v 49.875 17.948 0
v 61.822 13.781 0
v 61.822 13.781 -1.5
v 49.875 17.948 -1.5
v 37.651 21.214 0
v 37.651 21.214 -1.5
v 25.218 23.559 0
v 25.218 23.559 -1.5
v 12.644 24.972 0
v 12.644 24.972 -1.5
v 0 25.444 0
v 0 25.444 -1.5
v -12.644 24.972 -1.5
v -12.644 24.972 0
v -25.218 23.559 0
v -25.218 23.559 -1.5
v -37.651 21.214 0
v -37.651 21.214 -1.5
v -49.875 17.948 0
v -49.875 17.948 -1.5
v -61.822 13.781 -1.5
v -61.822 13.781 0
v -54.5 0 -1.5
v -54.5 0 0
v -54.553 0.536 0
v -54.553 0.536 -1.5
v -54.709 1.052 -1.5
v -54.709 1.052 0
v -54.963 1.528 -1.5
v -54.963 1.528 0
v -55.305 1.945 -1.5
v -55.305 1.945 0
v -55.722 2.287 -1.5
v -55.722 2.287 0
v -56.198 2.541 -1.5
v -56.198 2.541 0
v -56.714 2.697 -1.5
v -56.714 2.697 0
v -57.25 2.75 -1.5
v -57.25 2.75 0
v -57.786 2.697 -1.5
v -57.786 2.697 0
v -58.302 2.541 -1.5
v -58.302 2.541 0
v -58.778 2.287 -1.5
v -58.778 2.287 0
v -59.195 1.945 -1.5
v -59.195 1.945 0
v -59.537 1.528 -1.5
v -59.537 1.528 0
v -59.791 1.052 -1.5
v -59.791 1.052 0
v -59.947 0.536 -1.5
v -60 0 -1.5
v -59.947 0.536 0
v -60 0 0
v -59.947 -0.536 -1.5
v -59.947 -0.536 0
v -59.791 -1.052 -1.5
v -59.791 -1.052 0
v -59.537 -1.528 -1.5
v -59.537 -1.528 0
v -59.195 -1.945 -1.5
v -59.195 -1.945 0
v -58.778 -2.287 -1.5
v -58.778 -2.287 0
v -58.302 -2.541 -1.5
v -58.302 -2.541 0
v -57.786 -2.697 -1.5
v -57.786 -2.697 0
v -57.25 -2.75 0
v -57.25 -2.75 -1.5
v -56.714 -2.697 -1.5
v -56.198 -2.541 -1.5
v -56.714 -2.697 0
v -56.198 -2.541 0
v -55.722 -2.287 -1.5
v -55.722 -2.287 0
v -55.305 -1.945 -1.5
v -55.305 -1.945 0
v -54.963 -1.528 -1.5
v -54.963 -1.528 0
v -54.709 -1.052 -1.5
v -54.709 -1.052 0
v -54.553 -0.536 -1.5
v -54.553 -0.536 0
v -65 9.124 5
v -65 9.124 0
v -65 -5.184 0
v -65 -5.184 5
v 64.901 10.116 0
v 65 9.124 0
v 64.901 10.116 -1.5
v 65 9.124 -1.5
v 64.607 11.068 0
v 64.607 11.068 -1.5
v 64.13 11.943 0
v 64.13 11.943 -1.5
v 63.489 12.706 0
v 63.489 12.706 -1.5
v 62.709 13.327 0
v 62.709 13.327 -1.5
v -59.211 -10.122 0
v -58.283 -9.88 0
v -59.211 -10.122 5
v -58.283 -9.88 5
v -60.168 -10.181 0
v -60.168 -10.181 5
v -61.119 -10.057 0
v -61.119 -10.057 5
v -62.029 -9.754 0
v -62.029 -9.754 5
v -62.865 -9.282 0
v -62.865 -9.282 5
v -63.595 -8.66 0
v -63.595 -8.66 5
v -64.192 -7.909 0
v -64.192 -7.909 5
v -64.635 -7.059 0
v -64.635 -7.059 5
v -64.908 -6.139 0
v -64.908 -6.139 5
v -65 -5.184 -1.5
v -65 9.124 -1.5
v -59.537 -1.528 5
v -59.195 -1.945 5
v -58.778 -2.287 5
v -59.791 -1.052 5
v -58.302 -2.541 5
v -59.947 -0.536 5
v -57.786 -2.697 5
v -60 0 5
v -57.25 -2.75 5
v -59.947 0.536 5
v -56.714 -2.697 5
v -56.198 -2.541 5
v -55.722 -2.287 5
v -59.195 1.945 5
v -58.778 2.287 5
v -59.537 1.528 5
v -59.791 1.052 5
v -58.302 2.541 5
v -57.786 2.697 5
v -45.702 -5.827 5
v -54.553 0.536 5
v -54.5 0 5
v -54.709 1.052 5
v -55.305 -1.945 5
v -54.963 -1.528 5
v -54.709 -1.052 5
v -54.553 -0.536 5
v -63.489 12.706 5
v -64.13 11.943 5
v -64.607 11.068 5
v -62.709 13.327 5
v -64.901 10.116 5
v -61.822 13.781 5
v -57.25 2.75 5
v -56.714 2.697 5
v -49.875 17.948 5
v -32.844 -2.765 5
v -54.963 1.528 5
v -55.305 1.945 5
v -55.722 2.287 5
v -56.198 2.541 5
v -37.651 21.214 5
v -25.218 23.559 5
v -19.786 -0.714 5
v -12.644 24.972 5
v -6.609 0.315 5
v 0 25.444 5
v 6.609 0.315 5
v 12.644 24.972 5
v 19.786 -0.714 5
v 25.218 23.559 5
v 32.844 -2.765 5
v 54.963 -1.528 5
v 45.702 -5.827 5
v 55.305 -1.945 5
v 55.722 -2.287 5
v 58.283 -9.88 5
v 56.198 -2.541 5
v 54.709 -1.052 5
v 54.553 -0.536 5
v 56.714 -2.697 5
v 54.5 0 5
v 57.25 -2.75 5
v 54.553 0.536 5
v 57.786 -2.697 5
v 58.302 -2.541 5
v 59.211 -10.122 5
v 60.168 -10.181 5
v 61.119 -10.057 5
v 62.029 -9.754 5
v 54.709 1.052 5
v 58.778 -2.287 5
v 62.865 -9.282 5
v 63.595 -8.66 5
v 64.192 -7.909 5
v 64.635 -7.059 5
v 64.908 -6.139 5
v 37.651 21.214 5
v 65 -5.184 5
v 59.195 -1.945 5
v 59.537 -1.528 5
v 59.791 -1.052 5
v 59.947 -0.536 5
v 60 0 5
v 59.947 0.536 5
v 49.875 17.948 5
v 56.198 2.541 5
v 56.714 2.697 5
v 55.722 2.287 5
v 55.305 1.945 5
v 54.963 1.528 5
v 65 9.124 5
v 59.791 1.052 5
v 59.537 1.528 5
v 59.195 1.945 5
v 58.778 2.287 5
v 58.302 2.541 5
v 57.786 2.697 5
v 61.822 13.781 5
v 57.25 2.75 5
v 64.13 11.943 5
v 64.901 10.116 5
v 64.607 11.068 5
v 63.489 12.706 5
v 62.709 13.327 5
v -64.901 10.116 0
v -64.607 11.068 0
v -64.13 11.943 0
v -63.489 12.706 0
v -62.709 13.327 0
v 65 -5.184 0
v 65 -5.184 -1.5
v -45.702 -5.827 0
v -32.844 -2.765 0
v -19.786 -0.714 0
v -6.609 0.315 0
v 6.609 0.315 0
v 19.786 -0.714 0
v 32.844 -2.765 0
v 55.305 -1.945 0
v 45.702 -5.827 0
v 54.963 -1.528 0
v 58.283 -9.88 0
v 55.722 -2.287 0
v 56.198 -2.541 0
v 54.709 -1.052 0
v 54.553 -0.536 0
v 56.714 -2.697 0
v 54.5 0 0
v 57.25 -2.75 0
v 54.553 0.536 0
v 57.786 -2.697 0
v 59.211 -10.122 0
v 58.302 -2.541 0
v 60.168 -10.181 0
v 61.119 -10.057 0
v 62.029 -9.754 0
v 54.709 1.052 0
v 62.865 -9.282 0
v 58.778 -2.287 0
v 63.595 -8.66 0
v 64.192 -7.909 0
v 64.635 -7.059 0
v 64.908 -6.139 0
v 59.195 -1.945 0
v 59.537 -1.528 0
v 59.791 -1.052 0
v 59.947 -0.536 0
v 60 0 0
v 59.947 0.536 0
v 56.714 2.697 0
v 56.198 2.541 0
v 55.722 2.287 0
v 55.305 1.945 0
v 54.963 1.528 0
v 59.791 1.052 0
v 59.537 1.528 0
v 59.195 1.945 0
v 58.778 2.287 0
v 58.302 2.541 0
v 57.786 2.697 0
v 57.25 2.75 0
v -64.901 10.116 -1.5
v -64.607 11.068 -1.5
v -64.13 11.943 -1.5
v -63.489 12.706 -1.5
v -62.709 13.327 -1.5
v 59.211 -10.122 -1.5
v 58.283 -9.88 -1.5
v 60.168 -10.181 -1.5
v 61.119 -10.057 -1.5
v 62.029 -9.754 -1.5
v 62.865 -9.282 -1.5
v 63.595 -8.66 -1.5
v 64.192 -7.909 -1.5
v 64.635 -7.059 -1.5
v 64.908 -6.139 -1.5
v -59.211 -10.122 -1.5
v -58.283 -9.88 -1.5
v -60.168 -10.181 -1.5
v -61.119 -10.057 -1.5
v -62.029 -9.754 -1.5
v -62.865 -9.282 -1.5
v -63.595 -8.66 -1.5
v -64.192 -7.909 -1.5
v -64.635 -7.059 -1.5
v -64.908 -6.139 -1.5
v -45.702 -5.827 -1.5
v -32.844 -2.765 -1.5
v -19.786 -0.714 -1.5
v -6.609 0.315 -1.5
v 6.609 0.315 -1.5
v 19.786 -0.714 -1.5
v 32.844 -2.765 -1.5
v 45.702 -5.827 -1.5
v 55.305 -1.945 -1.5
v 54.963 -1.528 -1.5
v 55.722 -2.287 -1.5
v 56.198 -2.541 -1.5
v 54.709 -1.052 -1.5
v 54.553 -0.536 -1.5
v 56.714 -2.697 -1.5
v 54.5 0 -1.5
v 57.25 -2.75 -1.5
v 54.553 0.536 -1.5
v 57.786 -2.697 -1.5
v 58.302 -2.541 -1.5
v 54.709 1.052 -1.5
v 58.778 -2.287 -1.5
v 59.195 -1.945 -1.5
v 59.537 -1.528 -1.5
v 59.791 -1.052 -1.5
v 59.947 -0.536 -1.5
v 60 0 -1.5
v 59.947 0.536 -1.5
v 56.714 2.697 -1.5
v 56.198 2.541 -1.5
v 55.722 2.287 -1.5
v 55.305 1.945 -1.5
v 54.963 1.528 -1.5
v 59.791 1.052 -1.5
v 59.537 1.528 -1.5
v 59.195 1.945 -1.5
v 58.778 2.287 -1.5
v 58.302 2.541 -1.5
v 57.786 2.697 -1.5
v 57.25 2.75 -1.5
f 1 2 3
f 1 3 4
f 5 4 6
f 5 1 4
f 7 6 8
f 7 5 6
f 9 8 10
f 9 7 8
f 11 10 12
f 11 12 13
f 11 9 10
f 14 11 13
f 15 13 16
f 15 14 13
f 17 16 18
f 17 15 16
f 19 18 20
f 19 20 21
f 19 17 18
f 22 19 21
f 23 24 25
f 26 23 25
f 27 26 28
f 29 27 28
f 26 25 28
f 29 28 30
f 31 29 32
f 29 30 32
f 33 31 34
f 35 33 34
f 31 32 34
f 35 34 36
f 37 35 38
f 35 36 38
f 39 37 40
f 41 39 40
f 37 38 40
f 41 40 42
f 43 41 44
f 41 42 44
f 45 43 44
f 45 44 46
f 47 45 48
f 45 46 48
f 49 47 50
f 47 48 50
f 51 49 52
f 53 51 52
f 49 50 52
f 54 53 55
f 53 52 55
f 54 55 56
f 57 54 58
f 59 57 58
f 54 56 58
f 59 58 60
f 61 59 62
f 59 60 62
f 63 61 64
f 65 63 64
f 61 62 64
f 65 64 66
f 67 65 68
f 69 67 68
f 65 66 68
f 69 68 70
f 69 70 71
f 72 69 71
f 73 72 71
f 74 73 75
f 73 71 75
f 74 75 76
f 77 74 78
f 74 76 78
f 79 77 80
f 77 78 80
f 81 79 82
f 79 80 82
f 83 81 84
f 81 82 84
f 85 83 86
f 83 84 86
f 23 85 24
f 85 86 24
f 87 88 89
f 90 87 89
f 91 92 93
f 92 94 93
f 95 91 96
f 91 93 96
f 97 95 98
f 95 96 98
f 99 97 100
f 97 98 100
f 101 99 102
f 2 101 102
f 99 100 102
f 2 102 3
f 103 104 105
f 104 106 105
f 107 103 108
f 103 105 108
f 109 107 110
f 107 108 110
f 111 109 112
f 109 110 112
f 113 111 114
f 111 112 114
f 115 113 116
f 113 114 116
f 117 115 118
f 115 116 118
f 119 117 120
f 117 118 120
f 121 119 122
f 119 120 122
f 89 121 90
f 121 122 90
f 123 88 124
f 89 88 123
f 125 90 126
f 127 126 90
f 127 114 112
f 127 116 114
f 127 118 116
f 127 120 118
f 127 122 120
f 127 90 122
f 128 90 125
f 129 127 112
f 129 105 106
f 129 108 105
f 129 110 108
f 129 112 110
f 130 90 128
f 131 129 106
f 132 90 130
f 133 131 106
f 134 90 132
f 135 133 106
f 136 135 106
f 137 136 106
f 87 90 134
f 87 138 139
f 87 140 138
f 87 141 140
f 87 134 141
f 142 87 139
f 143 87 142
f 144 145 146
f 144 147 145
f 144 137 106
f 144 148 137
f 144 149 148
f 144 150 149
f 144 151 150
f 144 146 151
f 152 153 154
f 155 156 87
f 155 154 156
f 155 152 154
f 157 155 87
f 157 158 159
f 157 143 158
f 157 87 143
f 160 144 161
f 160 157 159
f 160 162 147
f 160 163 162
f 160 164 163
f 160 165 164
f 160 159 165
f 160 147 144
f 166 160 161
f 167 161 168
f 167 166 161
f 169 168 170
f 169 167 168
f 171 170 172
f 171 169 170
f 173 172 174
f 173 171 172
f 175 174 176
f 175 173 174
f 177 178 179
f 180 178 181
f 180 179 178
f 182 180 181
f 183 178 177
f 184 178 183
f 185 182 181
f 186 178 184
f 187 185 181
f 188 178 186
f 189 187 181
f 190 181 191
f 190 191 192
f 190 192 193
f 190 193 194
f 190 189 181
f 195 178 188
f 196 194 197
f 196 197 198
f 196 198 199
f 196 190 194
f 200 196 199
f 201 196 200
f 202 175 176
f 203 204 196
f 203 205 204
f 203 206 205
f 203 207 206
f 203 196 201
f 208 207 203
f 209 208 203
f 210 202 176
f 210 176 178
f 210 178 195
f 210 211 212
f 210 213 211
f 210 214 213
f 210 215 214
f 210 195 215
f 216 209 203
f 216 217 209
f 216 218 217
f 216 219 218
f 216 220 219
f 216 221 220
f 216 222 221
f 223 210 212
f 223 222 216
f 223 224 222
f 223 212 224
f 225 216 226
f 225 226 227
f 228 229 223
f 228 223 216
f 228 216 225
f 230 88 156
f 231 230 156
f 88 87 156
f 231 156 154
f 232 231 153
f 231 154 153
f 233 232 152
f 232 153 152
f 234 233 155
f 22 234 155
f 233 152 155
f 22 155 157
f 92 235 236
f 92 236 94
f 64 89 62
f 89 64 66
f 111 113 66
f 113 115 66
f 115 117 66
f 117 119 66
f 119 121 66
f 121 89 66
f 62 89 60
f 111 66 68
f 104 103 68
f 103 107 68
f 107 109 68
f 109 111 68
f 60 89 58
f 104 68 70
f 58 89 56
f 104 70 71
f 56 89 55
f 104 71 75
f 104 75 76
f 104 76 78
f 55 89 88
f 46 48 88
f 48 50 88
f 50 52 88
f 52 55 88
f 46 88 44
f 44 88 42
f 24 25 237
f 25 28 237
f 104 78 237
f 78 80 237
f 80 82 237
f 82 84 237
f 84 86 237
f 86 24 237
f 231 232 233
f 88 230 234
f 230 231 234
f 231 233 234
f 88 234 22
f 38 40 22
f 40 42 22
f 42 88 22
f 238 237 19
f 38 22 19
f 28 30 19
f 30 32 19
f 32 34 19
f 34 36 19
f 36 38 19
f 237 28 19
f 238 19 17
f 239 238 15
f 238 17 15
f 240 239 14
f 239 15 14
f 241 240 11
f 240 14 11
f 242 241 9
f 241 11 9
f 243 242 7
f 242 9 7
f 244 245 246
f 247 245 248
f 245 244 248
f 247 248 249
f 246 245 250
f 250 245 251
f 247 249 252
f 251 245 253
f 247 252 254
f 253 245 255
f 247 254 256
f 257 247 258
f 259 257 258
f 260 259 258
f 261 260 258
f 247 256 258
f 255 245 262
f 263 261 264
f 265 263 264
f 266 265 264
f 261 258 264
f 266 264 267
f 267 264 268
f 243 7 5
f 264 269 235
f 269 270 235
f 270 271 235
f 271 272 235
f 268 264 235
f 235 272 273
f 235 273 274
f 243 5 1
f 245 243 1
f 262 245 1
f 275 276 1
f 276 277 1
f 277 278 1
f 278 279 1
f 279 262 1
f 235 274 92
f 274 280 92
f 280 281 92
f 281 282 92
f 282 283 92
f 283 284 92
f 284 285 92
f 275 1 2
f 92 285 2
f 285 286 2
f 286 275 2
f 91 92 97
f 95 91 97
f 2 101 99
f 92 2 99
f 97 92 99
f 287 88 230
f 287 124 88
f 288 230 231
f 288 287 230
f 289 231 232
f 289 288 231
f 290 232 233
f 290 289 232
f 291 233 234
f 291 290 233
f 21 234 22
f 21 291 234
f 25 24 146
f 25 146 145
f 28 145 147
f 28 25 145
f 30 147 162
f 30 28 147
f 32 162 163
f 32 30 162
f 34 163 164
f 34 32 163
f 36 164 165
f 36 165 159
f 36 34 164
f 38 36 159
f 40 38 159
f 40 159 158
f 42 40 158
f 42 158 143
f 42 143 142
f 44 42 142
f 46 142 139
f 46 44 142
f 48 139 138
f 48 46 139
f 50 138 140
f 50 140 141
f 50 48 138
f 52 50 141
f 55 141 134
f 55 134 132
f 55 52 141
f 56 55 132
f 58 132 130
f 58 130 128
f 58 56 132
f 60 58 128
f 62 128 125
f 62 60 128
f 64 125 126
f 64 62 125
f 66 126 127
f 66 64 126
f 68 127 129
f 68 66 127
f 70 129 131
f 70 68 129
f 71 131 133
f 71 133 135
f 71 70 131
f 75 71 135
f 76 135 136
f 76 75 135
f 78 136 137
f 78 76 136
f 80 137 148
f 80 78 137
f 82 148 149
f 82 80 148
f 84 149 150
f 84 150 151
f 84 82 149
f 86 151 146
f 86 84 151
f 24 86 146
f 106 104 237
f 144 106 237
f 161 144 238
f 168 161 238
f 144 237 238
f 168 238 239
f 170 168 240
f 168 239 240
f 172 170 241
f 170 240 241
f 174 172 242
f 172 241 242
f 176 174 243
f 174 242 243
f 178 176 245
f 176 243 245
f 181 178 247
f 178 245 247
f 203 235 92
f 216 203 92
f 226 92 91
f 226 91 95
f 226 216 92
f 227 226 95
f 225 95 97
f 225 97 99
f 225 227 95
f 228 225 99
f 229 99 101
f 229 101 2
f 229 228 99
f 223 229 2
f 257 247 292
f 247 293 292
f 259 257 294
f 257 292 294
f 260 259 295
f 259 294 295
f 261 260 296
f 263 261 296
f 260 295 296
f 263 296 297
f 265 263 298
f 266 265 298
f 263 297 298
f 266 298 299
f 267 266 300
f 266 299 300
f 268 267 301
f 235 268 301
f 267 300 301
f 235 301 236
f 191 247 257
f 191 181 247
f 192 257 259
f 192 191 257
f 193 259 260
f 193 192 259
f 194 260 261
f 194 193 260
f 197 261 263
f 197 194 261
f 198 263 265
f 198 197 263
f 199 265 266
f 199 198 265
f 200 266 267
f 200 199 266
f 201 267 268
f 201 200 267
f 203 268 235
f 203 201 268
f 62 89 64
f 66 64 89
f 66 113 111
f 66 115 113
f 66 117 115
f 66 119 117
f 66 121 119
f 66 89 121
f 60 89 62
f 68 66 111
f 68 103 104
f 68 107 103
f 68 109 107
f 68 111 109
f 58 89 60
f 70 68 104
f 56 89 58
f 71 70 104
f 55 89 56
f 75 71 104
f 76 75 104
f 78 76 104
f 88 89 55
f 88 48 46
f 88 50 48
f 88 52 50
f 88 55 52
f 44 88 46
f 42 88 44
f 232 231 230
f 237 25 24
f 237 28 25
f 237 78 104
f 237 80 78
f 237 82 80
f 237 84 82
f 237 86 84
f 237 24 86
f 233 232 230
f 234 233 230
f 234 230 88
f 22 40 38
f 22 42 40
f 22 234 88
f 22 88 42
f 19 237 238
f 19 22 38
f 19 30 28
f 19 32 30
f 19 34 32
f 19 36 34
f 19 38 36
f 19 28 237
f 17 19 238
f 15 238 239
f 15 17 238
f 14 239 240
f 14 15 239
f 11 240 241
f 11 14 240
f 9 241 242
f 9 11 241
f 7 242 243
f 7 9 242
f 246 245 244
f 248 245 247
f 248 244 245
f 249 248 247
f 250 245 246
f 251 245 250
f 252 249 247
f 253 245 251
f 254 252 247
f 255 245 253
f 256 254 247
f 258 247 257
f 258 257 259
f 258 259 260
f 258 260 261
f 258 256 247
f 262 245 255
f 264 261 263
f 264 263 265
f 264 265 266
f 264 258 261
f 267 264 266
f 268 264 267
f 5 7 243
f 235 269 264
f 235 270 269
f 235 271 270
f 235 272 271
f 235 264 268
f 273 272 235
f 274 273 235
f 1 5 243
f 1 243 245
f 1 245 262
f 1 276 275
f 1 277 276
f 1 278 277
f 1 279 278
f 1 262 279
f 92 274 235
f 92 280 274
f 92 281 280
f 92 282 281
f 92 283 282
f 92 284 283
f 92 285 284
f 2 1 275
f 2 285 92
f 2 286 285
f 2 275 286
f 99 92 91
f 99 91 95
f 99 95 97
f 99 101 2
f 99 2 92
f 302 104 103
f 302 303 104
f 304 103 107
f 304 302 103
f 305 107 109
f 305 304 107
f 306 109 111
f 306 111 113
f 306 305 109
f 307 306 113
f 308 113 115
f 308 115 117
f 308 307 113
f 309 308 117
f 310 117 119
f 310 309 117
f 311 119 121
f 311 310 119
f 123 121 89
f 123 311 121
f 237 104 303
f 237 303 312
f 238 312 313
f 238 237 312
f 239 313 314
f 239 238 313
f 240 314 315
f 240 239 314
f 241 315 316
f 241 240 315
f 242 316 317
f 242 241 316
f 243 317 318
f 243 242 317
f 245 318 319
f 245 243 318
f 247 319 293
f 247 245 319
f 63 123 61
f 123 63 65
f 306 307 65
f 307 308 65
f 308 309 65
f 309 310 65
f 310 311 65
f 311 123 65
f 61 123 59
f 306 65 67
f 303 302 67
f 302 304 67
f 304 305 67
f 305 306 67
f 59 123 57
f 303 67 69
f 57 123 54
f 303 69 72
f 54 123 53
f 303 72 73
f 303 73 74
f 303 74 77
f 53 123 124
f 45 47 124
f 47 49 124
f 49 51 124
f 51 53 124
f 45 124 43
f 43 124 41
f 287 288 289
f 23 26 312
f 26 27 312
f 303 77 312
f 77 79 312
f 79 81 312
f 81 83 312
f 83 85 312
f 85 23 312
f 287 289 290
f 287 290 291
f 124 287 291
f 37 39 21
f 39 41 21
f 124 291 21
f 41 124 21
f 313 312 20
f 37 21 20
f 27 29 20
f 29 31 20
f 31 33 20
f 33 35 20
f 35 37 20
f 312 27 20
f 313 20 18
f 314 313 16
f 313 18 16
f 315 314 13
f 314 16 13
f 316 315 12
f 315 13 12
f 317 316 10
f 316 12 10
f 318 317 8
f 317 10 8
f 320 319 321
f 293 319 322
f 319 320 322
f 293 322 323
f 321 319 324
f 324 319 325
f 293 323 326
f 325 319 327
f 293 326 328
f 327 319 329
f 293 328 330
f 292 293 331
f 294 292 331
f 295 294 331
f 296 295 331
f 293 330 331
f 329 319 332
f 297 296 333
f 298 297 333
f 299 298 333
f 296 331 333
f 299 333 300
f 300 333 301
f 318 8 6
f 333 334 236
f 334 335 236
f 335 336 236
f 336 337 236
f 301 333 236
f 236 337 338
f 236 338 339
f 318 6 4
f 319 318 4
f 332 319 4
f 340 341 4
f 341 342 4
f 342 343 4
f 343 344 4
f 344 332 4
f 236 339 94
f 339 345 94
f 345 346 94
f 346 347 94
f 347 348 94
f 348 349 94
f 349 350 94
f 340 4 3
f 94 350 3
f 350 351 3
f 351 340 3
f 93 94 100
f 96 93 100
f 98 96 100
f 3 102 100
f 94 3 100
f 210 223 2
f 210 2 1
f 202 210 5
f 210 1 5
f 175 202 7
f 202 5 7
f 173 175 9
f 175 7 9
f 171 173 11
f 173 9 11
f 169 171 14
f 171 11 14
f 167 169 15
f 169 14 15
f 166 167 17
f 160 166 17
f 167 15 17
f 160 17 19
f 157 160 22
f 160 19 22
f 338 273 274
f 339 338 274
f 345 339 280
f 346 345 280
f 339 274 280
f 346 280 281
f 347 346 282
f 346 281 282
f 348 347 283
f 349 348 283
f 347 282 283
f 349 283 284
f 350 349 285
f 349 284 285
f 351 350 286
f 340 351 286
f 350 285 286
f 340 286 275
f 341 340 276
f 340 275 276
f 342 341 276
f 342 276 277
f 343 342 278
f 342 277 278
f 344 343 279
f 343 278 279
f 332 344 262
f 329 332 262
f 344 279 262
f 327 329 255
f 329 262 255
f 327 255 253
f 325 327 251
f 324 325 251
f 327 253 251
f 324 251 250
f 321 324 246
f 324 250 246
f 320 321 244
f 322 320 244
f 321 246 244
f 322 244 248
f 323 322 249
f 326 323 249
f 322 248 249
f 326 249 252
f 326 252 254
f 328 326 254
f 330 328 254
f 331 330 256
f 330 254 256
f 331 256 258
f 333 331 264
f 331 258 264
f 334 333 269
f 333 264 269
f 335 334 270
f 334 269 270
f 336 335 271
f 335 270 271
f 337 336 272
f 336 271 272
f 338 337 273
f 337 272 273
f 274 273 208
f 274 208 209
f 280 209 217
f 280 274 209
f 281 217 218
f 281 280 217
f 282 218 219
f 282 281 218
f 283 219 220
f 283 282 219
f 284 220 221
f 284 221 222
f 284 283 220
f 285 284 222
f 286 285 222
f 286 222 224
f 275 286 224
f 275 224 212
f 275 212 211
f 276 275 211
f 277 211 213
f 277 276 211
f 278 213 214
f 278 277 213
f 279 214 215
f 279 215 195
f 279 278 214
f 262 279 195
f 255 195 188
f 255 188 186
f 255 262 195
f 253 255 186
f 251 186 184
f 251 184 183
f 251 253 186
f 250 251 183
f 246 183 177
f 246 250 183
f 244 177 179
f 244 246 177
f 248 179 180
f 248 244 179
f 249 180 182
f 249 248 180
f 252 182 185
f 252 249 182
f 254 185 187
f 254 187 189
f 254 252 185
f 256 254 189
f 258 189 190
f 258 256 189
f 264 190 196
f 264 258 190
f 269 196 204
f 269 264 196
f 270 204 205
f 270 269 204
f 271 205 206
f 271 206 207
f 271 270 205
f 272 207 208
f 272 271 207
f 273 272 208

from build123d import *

# Parameters (mm, degrees)
F0_R     = 2.75
F1_DEPTH = 5
F2_DEPTH = 1.5
F3_R     = 5
F3_2_R   = 5


with BuildPart() as f1:
    # F0 (on Top) → F1 (new body)
    with BuildSketch(Plane.XY):
        with BuildLine():
            ThreePointArc((-65, -12.5), (0, 0.443714), (65, -12.5))
            Line((65, -12.5), (65, 12.5))
            ThreePointArc((65, 12.5), (0, 25.443714), (-65, 12.5))
            Line((-65, 12.5), (-65, -12.5))
        make_face()
        with Locations((-57.25, 0)):
            Circle(F0_R, mode=Mode.SUBTRACT)
        with Locations((57.25, 0)):
            Circle(F0_R, mode=Mode.SUBTRACT)
    extrude(amount=F1_DEPTH)

    # F3
    f3_edges = [f1.edges().sort_by_distance(p)[0] for p in [
        (-65, -12.5, 2.5),
        (65, -12.5, 2.5),
        (65, 12.5, 2.5),
        (-65, 12.5, 2.5),
    ]]
    fillet(f3_edges, radius=F3_R)


with BuildPart() as f2:
    # F0 (on Top) → F2 (new body)
    with BuildSketch(Plane.XY):
        with BuildLine():
            ThreePointArc((-65, -12.5), (0, 0.443714), (65, -12.5))
            Line((65, -12.5), (65, 12.5))
            ThreePointArc((65, 12.5), (0, 25.443714), (-65, 12.5))
            Line((-65, 12.5), (-65, -12.5))
        make_face()
        with Locations((-57.25, 0)):
            Circle(F0_R, mode=Mode.SUBTRACT)
        with Locations((57.25, 0)):
            Circle(F0_R, mode=Mode.SUBTRACT)
    extrude(amount=-F2_DEPTH)

    # F3#2
    f3_2_edges = [f2.edges().sort_by_distance(p)[0] for p in [
        (-65, -12.5, -0.75),
        (65, -12.5, -0.75),
        (65, 12.5, -0.75),
        (-65, 12.5, -0.75),
    ]]
    fillet(f3_2_edges, radius=F3_2_R)


solid = Compound([f1.part, f2.part])
